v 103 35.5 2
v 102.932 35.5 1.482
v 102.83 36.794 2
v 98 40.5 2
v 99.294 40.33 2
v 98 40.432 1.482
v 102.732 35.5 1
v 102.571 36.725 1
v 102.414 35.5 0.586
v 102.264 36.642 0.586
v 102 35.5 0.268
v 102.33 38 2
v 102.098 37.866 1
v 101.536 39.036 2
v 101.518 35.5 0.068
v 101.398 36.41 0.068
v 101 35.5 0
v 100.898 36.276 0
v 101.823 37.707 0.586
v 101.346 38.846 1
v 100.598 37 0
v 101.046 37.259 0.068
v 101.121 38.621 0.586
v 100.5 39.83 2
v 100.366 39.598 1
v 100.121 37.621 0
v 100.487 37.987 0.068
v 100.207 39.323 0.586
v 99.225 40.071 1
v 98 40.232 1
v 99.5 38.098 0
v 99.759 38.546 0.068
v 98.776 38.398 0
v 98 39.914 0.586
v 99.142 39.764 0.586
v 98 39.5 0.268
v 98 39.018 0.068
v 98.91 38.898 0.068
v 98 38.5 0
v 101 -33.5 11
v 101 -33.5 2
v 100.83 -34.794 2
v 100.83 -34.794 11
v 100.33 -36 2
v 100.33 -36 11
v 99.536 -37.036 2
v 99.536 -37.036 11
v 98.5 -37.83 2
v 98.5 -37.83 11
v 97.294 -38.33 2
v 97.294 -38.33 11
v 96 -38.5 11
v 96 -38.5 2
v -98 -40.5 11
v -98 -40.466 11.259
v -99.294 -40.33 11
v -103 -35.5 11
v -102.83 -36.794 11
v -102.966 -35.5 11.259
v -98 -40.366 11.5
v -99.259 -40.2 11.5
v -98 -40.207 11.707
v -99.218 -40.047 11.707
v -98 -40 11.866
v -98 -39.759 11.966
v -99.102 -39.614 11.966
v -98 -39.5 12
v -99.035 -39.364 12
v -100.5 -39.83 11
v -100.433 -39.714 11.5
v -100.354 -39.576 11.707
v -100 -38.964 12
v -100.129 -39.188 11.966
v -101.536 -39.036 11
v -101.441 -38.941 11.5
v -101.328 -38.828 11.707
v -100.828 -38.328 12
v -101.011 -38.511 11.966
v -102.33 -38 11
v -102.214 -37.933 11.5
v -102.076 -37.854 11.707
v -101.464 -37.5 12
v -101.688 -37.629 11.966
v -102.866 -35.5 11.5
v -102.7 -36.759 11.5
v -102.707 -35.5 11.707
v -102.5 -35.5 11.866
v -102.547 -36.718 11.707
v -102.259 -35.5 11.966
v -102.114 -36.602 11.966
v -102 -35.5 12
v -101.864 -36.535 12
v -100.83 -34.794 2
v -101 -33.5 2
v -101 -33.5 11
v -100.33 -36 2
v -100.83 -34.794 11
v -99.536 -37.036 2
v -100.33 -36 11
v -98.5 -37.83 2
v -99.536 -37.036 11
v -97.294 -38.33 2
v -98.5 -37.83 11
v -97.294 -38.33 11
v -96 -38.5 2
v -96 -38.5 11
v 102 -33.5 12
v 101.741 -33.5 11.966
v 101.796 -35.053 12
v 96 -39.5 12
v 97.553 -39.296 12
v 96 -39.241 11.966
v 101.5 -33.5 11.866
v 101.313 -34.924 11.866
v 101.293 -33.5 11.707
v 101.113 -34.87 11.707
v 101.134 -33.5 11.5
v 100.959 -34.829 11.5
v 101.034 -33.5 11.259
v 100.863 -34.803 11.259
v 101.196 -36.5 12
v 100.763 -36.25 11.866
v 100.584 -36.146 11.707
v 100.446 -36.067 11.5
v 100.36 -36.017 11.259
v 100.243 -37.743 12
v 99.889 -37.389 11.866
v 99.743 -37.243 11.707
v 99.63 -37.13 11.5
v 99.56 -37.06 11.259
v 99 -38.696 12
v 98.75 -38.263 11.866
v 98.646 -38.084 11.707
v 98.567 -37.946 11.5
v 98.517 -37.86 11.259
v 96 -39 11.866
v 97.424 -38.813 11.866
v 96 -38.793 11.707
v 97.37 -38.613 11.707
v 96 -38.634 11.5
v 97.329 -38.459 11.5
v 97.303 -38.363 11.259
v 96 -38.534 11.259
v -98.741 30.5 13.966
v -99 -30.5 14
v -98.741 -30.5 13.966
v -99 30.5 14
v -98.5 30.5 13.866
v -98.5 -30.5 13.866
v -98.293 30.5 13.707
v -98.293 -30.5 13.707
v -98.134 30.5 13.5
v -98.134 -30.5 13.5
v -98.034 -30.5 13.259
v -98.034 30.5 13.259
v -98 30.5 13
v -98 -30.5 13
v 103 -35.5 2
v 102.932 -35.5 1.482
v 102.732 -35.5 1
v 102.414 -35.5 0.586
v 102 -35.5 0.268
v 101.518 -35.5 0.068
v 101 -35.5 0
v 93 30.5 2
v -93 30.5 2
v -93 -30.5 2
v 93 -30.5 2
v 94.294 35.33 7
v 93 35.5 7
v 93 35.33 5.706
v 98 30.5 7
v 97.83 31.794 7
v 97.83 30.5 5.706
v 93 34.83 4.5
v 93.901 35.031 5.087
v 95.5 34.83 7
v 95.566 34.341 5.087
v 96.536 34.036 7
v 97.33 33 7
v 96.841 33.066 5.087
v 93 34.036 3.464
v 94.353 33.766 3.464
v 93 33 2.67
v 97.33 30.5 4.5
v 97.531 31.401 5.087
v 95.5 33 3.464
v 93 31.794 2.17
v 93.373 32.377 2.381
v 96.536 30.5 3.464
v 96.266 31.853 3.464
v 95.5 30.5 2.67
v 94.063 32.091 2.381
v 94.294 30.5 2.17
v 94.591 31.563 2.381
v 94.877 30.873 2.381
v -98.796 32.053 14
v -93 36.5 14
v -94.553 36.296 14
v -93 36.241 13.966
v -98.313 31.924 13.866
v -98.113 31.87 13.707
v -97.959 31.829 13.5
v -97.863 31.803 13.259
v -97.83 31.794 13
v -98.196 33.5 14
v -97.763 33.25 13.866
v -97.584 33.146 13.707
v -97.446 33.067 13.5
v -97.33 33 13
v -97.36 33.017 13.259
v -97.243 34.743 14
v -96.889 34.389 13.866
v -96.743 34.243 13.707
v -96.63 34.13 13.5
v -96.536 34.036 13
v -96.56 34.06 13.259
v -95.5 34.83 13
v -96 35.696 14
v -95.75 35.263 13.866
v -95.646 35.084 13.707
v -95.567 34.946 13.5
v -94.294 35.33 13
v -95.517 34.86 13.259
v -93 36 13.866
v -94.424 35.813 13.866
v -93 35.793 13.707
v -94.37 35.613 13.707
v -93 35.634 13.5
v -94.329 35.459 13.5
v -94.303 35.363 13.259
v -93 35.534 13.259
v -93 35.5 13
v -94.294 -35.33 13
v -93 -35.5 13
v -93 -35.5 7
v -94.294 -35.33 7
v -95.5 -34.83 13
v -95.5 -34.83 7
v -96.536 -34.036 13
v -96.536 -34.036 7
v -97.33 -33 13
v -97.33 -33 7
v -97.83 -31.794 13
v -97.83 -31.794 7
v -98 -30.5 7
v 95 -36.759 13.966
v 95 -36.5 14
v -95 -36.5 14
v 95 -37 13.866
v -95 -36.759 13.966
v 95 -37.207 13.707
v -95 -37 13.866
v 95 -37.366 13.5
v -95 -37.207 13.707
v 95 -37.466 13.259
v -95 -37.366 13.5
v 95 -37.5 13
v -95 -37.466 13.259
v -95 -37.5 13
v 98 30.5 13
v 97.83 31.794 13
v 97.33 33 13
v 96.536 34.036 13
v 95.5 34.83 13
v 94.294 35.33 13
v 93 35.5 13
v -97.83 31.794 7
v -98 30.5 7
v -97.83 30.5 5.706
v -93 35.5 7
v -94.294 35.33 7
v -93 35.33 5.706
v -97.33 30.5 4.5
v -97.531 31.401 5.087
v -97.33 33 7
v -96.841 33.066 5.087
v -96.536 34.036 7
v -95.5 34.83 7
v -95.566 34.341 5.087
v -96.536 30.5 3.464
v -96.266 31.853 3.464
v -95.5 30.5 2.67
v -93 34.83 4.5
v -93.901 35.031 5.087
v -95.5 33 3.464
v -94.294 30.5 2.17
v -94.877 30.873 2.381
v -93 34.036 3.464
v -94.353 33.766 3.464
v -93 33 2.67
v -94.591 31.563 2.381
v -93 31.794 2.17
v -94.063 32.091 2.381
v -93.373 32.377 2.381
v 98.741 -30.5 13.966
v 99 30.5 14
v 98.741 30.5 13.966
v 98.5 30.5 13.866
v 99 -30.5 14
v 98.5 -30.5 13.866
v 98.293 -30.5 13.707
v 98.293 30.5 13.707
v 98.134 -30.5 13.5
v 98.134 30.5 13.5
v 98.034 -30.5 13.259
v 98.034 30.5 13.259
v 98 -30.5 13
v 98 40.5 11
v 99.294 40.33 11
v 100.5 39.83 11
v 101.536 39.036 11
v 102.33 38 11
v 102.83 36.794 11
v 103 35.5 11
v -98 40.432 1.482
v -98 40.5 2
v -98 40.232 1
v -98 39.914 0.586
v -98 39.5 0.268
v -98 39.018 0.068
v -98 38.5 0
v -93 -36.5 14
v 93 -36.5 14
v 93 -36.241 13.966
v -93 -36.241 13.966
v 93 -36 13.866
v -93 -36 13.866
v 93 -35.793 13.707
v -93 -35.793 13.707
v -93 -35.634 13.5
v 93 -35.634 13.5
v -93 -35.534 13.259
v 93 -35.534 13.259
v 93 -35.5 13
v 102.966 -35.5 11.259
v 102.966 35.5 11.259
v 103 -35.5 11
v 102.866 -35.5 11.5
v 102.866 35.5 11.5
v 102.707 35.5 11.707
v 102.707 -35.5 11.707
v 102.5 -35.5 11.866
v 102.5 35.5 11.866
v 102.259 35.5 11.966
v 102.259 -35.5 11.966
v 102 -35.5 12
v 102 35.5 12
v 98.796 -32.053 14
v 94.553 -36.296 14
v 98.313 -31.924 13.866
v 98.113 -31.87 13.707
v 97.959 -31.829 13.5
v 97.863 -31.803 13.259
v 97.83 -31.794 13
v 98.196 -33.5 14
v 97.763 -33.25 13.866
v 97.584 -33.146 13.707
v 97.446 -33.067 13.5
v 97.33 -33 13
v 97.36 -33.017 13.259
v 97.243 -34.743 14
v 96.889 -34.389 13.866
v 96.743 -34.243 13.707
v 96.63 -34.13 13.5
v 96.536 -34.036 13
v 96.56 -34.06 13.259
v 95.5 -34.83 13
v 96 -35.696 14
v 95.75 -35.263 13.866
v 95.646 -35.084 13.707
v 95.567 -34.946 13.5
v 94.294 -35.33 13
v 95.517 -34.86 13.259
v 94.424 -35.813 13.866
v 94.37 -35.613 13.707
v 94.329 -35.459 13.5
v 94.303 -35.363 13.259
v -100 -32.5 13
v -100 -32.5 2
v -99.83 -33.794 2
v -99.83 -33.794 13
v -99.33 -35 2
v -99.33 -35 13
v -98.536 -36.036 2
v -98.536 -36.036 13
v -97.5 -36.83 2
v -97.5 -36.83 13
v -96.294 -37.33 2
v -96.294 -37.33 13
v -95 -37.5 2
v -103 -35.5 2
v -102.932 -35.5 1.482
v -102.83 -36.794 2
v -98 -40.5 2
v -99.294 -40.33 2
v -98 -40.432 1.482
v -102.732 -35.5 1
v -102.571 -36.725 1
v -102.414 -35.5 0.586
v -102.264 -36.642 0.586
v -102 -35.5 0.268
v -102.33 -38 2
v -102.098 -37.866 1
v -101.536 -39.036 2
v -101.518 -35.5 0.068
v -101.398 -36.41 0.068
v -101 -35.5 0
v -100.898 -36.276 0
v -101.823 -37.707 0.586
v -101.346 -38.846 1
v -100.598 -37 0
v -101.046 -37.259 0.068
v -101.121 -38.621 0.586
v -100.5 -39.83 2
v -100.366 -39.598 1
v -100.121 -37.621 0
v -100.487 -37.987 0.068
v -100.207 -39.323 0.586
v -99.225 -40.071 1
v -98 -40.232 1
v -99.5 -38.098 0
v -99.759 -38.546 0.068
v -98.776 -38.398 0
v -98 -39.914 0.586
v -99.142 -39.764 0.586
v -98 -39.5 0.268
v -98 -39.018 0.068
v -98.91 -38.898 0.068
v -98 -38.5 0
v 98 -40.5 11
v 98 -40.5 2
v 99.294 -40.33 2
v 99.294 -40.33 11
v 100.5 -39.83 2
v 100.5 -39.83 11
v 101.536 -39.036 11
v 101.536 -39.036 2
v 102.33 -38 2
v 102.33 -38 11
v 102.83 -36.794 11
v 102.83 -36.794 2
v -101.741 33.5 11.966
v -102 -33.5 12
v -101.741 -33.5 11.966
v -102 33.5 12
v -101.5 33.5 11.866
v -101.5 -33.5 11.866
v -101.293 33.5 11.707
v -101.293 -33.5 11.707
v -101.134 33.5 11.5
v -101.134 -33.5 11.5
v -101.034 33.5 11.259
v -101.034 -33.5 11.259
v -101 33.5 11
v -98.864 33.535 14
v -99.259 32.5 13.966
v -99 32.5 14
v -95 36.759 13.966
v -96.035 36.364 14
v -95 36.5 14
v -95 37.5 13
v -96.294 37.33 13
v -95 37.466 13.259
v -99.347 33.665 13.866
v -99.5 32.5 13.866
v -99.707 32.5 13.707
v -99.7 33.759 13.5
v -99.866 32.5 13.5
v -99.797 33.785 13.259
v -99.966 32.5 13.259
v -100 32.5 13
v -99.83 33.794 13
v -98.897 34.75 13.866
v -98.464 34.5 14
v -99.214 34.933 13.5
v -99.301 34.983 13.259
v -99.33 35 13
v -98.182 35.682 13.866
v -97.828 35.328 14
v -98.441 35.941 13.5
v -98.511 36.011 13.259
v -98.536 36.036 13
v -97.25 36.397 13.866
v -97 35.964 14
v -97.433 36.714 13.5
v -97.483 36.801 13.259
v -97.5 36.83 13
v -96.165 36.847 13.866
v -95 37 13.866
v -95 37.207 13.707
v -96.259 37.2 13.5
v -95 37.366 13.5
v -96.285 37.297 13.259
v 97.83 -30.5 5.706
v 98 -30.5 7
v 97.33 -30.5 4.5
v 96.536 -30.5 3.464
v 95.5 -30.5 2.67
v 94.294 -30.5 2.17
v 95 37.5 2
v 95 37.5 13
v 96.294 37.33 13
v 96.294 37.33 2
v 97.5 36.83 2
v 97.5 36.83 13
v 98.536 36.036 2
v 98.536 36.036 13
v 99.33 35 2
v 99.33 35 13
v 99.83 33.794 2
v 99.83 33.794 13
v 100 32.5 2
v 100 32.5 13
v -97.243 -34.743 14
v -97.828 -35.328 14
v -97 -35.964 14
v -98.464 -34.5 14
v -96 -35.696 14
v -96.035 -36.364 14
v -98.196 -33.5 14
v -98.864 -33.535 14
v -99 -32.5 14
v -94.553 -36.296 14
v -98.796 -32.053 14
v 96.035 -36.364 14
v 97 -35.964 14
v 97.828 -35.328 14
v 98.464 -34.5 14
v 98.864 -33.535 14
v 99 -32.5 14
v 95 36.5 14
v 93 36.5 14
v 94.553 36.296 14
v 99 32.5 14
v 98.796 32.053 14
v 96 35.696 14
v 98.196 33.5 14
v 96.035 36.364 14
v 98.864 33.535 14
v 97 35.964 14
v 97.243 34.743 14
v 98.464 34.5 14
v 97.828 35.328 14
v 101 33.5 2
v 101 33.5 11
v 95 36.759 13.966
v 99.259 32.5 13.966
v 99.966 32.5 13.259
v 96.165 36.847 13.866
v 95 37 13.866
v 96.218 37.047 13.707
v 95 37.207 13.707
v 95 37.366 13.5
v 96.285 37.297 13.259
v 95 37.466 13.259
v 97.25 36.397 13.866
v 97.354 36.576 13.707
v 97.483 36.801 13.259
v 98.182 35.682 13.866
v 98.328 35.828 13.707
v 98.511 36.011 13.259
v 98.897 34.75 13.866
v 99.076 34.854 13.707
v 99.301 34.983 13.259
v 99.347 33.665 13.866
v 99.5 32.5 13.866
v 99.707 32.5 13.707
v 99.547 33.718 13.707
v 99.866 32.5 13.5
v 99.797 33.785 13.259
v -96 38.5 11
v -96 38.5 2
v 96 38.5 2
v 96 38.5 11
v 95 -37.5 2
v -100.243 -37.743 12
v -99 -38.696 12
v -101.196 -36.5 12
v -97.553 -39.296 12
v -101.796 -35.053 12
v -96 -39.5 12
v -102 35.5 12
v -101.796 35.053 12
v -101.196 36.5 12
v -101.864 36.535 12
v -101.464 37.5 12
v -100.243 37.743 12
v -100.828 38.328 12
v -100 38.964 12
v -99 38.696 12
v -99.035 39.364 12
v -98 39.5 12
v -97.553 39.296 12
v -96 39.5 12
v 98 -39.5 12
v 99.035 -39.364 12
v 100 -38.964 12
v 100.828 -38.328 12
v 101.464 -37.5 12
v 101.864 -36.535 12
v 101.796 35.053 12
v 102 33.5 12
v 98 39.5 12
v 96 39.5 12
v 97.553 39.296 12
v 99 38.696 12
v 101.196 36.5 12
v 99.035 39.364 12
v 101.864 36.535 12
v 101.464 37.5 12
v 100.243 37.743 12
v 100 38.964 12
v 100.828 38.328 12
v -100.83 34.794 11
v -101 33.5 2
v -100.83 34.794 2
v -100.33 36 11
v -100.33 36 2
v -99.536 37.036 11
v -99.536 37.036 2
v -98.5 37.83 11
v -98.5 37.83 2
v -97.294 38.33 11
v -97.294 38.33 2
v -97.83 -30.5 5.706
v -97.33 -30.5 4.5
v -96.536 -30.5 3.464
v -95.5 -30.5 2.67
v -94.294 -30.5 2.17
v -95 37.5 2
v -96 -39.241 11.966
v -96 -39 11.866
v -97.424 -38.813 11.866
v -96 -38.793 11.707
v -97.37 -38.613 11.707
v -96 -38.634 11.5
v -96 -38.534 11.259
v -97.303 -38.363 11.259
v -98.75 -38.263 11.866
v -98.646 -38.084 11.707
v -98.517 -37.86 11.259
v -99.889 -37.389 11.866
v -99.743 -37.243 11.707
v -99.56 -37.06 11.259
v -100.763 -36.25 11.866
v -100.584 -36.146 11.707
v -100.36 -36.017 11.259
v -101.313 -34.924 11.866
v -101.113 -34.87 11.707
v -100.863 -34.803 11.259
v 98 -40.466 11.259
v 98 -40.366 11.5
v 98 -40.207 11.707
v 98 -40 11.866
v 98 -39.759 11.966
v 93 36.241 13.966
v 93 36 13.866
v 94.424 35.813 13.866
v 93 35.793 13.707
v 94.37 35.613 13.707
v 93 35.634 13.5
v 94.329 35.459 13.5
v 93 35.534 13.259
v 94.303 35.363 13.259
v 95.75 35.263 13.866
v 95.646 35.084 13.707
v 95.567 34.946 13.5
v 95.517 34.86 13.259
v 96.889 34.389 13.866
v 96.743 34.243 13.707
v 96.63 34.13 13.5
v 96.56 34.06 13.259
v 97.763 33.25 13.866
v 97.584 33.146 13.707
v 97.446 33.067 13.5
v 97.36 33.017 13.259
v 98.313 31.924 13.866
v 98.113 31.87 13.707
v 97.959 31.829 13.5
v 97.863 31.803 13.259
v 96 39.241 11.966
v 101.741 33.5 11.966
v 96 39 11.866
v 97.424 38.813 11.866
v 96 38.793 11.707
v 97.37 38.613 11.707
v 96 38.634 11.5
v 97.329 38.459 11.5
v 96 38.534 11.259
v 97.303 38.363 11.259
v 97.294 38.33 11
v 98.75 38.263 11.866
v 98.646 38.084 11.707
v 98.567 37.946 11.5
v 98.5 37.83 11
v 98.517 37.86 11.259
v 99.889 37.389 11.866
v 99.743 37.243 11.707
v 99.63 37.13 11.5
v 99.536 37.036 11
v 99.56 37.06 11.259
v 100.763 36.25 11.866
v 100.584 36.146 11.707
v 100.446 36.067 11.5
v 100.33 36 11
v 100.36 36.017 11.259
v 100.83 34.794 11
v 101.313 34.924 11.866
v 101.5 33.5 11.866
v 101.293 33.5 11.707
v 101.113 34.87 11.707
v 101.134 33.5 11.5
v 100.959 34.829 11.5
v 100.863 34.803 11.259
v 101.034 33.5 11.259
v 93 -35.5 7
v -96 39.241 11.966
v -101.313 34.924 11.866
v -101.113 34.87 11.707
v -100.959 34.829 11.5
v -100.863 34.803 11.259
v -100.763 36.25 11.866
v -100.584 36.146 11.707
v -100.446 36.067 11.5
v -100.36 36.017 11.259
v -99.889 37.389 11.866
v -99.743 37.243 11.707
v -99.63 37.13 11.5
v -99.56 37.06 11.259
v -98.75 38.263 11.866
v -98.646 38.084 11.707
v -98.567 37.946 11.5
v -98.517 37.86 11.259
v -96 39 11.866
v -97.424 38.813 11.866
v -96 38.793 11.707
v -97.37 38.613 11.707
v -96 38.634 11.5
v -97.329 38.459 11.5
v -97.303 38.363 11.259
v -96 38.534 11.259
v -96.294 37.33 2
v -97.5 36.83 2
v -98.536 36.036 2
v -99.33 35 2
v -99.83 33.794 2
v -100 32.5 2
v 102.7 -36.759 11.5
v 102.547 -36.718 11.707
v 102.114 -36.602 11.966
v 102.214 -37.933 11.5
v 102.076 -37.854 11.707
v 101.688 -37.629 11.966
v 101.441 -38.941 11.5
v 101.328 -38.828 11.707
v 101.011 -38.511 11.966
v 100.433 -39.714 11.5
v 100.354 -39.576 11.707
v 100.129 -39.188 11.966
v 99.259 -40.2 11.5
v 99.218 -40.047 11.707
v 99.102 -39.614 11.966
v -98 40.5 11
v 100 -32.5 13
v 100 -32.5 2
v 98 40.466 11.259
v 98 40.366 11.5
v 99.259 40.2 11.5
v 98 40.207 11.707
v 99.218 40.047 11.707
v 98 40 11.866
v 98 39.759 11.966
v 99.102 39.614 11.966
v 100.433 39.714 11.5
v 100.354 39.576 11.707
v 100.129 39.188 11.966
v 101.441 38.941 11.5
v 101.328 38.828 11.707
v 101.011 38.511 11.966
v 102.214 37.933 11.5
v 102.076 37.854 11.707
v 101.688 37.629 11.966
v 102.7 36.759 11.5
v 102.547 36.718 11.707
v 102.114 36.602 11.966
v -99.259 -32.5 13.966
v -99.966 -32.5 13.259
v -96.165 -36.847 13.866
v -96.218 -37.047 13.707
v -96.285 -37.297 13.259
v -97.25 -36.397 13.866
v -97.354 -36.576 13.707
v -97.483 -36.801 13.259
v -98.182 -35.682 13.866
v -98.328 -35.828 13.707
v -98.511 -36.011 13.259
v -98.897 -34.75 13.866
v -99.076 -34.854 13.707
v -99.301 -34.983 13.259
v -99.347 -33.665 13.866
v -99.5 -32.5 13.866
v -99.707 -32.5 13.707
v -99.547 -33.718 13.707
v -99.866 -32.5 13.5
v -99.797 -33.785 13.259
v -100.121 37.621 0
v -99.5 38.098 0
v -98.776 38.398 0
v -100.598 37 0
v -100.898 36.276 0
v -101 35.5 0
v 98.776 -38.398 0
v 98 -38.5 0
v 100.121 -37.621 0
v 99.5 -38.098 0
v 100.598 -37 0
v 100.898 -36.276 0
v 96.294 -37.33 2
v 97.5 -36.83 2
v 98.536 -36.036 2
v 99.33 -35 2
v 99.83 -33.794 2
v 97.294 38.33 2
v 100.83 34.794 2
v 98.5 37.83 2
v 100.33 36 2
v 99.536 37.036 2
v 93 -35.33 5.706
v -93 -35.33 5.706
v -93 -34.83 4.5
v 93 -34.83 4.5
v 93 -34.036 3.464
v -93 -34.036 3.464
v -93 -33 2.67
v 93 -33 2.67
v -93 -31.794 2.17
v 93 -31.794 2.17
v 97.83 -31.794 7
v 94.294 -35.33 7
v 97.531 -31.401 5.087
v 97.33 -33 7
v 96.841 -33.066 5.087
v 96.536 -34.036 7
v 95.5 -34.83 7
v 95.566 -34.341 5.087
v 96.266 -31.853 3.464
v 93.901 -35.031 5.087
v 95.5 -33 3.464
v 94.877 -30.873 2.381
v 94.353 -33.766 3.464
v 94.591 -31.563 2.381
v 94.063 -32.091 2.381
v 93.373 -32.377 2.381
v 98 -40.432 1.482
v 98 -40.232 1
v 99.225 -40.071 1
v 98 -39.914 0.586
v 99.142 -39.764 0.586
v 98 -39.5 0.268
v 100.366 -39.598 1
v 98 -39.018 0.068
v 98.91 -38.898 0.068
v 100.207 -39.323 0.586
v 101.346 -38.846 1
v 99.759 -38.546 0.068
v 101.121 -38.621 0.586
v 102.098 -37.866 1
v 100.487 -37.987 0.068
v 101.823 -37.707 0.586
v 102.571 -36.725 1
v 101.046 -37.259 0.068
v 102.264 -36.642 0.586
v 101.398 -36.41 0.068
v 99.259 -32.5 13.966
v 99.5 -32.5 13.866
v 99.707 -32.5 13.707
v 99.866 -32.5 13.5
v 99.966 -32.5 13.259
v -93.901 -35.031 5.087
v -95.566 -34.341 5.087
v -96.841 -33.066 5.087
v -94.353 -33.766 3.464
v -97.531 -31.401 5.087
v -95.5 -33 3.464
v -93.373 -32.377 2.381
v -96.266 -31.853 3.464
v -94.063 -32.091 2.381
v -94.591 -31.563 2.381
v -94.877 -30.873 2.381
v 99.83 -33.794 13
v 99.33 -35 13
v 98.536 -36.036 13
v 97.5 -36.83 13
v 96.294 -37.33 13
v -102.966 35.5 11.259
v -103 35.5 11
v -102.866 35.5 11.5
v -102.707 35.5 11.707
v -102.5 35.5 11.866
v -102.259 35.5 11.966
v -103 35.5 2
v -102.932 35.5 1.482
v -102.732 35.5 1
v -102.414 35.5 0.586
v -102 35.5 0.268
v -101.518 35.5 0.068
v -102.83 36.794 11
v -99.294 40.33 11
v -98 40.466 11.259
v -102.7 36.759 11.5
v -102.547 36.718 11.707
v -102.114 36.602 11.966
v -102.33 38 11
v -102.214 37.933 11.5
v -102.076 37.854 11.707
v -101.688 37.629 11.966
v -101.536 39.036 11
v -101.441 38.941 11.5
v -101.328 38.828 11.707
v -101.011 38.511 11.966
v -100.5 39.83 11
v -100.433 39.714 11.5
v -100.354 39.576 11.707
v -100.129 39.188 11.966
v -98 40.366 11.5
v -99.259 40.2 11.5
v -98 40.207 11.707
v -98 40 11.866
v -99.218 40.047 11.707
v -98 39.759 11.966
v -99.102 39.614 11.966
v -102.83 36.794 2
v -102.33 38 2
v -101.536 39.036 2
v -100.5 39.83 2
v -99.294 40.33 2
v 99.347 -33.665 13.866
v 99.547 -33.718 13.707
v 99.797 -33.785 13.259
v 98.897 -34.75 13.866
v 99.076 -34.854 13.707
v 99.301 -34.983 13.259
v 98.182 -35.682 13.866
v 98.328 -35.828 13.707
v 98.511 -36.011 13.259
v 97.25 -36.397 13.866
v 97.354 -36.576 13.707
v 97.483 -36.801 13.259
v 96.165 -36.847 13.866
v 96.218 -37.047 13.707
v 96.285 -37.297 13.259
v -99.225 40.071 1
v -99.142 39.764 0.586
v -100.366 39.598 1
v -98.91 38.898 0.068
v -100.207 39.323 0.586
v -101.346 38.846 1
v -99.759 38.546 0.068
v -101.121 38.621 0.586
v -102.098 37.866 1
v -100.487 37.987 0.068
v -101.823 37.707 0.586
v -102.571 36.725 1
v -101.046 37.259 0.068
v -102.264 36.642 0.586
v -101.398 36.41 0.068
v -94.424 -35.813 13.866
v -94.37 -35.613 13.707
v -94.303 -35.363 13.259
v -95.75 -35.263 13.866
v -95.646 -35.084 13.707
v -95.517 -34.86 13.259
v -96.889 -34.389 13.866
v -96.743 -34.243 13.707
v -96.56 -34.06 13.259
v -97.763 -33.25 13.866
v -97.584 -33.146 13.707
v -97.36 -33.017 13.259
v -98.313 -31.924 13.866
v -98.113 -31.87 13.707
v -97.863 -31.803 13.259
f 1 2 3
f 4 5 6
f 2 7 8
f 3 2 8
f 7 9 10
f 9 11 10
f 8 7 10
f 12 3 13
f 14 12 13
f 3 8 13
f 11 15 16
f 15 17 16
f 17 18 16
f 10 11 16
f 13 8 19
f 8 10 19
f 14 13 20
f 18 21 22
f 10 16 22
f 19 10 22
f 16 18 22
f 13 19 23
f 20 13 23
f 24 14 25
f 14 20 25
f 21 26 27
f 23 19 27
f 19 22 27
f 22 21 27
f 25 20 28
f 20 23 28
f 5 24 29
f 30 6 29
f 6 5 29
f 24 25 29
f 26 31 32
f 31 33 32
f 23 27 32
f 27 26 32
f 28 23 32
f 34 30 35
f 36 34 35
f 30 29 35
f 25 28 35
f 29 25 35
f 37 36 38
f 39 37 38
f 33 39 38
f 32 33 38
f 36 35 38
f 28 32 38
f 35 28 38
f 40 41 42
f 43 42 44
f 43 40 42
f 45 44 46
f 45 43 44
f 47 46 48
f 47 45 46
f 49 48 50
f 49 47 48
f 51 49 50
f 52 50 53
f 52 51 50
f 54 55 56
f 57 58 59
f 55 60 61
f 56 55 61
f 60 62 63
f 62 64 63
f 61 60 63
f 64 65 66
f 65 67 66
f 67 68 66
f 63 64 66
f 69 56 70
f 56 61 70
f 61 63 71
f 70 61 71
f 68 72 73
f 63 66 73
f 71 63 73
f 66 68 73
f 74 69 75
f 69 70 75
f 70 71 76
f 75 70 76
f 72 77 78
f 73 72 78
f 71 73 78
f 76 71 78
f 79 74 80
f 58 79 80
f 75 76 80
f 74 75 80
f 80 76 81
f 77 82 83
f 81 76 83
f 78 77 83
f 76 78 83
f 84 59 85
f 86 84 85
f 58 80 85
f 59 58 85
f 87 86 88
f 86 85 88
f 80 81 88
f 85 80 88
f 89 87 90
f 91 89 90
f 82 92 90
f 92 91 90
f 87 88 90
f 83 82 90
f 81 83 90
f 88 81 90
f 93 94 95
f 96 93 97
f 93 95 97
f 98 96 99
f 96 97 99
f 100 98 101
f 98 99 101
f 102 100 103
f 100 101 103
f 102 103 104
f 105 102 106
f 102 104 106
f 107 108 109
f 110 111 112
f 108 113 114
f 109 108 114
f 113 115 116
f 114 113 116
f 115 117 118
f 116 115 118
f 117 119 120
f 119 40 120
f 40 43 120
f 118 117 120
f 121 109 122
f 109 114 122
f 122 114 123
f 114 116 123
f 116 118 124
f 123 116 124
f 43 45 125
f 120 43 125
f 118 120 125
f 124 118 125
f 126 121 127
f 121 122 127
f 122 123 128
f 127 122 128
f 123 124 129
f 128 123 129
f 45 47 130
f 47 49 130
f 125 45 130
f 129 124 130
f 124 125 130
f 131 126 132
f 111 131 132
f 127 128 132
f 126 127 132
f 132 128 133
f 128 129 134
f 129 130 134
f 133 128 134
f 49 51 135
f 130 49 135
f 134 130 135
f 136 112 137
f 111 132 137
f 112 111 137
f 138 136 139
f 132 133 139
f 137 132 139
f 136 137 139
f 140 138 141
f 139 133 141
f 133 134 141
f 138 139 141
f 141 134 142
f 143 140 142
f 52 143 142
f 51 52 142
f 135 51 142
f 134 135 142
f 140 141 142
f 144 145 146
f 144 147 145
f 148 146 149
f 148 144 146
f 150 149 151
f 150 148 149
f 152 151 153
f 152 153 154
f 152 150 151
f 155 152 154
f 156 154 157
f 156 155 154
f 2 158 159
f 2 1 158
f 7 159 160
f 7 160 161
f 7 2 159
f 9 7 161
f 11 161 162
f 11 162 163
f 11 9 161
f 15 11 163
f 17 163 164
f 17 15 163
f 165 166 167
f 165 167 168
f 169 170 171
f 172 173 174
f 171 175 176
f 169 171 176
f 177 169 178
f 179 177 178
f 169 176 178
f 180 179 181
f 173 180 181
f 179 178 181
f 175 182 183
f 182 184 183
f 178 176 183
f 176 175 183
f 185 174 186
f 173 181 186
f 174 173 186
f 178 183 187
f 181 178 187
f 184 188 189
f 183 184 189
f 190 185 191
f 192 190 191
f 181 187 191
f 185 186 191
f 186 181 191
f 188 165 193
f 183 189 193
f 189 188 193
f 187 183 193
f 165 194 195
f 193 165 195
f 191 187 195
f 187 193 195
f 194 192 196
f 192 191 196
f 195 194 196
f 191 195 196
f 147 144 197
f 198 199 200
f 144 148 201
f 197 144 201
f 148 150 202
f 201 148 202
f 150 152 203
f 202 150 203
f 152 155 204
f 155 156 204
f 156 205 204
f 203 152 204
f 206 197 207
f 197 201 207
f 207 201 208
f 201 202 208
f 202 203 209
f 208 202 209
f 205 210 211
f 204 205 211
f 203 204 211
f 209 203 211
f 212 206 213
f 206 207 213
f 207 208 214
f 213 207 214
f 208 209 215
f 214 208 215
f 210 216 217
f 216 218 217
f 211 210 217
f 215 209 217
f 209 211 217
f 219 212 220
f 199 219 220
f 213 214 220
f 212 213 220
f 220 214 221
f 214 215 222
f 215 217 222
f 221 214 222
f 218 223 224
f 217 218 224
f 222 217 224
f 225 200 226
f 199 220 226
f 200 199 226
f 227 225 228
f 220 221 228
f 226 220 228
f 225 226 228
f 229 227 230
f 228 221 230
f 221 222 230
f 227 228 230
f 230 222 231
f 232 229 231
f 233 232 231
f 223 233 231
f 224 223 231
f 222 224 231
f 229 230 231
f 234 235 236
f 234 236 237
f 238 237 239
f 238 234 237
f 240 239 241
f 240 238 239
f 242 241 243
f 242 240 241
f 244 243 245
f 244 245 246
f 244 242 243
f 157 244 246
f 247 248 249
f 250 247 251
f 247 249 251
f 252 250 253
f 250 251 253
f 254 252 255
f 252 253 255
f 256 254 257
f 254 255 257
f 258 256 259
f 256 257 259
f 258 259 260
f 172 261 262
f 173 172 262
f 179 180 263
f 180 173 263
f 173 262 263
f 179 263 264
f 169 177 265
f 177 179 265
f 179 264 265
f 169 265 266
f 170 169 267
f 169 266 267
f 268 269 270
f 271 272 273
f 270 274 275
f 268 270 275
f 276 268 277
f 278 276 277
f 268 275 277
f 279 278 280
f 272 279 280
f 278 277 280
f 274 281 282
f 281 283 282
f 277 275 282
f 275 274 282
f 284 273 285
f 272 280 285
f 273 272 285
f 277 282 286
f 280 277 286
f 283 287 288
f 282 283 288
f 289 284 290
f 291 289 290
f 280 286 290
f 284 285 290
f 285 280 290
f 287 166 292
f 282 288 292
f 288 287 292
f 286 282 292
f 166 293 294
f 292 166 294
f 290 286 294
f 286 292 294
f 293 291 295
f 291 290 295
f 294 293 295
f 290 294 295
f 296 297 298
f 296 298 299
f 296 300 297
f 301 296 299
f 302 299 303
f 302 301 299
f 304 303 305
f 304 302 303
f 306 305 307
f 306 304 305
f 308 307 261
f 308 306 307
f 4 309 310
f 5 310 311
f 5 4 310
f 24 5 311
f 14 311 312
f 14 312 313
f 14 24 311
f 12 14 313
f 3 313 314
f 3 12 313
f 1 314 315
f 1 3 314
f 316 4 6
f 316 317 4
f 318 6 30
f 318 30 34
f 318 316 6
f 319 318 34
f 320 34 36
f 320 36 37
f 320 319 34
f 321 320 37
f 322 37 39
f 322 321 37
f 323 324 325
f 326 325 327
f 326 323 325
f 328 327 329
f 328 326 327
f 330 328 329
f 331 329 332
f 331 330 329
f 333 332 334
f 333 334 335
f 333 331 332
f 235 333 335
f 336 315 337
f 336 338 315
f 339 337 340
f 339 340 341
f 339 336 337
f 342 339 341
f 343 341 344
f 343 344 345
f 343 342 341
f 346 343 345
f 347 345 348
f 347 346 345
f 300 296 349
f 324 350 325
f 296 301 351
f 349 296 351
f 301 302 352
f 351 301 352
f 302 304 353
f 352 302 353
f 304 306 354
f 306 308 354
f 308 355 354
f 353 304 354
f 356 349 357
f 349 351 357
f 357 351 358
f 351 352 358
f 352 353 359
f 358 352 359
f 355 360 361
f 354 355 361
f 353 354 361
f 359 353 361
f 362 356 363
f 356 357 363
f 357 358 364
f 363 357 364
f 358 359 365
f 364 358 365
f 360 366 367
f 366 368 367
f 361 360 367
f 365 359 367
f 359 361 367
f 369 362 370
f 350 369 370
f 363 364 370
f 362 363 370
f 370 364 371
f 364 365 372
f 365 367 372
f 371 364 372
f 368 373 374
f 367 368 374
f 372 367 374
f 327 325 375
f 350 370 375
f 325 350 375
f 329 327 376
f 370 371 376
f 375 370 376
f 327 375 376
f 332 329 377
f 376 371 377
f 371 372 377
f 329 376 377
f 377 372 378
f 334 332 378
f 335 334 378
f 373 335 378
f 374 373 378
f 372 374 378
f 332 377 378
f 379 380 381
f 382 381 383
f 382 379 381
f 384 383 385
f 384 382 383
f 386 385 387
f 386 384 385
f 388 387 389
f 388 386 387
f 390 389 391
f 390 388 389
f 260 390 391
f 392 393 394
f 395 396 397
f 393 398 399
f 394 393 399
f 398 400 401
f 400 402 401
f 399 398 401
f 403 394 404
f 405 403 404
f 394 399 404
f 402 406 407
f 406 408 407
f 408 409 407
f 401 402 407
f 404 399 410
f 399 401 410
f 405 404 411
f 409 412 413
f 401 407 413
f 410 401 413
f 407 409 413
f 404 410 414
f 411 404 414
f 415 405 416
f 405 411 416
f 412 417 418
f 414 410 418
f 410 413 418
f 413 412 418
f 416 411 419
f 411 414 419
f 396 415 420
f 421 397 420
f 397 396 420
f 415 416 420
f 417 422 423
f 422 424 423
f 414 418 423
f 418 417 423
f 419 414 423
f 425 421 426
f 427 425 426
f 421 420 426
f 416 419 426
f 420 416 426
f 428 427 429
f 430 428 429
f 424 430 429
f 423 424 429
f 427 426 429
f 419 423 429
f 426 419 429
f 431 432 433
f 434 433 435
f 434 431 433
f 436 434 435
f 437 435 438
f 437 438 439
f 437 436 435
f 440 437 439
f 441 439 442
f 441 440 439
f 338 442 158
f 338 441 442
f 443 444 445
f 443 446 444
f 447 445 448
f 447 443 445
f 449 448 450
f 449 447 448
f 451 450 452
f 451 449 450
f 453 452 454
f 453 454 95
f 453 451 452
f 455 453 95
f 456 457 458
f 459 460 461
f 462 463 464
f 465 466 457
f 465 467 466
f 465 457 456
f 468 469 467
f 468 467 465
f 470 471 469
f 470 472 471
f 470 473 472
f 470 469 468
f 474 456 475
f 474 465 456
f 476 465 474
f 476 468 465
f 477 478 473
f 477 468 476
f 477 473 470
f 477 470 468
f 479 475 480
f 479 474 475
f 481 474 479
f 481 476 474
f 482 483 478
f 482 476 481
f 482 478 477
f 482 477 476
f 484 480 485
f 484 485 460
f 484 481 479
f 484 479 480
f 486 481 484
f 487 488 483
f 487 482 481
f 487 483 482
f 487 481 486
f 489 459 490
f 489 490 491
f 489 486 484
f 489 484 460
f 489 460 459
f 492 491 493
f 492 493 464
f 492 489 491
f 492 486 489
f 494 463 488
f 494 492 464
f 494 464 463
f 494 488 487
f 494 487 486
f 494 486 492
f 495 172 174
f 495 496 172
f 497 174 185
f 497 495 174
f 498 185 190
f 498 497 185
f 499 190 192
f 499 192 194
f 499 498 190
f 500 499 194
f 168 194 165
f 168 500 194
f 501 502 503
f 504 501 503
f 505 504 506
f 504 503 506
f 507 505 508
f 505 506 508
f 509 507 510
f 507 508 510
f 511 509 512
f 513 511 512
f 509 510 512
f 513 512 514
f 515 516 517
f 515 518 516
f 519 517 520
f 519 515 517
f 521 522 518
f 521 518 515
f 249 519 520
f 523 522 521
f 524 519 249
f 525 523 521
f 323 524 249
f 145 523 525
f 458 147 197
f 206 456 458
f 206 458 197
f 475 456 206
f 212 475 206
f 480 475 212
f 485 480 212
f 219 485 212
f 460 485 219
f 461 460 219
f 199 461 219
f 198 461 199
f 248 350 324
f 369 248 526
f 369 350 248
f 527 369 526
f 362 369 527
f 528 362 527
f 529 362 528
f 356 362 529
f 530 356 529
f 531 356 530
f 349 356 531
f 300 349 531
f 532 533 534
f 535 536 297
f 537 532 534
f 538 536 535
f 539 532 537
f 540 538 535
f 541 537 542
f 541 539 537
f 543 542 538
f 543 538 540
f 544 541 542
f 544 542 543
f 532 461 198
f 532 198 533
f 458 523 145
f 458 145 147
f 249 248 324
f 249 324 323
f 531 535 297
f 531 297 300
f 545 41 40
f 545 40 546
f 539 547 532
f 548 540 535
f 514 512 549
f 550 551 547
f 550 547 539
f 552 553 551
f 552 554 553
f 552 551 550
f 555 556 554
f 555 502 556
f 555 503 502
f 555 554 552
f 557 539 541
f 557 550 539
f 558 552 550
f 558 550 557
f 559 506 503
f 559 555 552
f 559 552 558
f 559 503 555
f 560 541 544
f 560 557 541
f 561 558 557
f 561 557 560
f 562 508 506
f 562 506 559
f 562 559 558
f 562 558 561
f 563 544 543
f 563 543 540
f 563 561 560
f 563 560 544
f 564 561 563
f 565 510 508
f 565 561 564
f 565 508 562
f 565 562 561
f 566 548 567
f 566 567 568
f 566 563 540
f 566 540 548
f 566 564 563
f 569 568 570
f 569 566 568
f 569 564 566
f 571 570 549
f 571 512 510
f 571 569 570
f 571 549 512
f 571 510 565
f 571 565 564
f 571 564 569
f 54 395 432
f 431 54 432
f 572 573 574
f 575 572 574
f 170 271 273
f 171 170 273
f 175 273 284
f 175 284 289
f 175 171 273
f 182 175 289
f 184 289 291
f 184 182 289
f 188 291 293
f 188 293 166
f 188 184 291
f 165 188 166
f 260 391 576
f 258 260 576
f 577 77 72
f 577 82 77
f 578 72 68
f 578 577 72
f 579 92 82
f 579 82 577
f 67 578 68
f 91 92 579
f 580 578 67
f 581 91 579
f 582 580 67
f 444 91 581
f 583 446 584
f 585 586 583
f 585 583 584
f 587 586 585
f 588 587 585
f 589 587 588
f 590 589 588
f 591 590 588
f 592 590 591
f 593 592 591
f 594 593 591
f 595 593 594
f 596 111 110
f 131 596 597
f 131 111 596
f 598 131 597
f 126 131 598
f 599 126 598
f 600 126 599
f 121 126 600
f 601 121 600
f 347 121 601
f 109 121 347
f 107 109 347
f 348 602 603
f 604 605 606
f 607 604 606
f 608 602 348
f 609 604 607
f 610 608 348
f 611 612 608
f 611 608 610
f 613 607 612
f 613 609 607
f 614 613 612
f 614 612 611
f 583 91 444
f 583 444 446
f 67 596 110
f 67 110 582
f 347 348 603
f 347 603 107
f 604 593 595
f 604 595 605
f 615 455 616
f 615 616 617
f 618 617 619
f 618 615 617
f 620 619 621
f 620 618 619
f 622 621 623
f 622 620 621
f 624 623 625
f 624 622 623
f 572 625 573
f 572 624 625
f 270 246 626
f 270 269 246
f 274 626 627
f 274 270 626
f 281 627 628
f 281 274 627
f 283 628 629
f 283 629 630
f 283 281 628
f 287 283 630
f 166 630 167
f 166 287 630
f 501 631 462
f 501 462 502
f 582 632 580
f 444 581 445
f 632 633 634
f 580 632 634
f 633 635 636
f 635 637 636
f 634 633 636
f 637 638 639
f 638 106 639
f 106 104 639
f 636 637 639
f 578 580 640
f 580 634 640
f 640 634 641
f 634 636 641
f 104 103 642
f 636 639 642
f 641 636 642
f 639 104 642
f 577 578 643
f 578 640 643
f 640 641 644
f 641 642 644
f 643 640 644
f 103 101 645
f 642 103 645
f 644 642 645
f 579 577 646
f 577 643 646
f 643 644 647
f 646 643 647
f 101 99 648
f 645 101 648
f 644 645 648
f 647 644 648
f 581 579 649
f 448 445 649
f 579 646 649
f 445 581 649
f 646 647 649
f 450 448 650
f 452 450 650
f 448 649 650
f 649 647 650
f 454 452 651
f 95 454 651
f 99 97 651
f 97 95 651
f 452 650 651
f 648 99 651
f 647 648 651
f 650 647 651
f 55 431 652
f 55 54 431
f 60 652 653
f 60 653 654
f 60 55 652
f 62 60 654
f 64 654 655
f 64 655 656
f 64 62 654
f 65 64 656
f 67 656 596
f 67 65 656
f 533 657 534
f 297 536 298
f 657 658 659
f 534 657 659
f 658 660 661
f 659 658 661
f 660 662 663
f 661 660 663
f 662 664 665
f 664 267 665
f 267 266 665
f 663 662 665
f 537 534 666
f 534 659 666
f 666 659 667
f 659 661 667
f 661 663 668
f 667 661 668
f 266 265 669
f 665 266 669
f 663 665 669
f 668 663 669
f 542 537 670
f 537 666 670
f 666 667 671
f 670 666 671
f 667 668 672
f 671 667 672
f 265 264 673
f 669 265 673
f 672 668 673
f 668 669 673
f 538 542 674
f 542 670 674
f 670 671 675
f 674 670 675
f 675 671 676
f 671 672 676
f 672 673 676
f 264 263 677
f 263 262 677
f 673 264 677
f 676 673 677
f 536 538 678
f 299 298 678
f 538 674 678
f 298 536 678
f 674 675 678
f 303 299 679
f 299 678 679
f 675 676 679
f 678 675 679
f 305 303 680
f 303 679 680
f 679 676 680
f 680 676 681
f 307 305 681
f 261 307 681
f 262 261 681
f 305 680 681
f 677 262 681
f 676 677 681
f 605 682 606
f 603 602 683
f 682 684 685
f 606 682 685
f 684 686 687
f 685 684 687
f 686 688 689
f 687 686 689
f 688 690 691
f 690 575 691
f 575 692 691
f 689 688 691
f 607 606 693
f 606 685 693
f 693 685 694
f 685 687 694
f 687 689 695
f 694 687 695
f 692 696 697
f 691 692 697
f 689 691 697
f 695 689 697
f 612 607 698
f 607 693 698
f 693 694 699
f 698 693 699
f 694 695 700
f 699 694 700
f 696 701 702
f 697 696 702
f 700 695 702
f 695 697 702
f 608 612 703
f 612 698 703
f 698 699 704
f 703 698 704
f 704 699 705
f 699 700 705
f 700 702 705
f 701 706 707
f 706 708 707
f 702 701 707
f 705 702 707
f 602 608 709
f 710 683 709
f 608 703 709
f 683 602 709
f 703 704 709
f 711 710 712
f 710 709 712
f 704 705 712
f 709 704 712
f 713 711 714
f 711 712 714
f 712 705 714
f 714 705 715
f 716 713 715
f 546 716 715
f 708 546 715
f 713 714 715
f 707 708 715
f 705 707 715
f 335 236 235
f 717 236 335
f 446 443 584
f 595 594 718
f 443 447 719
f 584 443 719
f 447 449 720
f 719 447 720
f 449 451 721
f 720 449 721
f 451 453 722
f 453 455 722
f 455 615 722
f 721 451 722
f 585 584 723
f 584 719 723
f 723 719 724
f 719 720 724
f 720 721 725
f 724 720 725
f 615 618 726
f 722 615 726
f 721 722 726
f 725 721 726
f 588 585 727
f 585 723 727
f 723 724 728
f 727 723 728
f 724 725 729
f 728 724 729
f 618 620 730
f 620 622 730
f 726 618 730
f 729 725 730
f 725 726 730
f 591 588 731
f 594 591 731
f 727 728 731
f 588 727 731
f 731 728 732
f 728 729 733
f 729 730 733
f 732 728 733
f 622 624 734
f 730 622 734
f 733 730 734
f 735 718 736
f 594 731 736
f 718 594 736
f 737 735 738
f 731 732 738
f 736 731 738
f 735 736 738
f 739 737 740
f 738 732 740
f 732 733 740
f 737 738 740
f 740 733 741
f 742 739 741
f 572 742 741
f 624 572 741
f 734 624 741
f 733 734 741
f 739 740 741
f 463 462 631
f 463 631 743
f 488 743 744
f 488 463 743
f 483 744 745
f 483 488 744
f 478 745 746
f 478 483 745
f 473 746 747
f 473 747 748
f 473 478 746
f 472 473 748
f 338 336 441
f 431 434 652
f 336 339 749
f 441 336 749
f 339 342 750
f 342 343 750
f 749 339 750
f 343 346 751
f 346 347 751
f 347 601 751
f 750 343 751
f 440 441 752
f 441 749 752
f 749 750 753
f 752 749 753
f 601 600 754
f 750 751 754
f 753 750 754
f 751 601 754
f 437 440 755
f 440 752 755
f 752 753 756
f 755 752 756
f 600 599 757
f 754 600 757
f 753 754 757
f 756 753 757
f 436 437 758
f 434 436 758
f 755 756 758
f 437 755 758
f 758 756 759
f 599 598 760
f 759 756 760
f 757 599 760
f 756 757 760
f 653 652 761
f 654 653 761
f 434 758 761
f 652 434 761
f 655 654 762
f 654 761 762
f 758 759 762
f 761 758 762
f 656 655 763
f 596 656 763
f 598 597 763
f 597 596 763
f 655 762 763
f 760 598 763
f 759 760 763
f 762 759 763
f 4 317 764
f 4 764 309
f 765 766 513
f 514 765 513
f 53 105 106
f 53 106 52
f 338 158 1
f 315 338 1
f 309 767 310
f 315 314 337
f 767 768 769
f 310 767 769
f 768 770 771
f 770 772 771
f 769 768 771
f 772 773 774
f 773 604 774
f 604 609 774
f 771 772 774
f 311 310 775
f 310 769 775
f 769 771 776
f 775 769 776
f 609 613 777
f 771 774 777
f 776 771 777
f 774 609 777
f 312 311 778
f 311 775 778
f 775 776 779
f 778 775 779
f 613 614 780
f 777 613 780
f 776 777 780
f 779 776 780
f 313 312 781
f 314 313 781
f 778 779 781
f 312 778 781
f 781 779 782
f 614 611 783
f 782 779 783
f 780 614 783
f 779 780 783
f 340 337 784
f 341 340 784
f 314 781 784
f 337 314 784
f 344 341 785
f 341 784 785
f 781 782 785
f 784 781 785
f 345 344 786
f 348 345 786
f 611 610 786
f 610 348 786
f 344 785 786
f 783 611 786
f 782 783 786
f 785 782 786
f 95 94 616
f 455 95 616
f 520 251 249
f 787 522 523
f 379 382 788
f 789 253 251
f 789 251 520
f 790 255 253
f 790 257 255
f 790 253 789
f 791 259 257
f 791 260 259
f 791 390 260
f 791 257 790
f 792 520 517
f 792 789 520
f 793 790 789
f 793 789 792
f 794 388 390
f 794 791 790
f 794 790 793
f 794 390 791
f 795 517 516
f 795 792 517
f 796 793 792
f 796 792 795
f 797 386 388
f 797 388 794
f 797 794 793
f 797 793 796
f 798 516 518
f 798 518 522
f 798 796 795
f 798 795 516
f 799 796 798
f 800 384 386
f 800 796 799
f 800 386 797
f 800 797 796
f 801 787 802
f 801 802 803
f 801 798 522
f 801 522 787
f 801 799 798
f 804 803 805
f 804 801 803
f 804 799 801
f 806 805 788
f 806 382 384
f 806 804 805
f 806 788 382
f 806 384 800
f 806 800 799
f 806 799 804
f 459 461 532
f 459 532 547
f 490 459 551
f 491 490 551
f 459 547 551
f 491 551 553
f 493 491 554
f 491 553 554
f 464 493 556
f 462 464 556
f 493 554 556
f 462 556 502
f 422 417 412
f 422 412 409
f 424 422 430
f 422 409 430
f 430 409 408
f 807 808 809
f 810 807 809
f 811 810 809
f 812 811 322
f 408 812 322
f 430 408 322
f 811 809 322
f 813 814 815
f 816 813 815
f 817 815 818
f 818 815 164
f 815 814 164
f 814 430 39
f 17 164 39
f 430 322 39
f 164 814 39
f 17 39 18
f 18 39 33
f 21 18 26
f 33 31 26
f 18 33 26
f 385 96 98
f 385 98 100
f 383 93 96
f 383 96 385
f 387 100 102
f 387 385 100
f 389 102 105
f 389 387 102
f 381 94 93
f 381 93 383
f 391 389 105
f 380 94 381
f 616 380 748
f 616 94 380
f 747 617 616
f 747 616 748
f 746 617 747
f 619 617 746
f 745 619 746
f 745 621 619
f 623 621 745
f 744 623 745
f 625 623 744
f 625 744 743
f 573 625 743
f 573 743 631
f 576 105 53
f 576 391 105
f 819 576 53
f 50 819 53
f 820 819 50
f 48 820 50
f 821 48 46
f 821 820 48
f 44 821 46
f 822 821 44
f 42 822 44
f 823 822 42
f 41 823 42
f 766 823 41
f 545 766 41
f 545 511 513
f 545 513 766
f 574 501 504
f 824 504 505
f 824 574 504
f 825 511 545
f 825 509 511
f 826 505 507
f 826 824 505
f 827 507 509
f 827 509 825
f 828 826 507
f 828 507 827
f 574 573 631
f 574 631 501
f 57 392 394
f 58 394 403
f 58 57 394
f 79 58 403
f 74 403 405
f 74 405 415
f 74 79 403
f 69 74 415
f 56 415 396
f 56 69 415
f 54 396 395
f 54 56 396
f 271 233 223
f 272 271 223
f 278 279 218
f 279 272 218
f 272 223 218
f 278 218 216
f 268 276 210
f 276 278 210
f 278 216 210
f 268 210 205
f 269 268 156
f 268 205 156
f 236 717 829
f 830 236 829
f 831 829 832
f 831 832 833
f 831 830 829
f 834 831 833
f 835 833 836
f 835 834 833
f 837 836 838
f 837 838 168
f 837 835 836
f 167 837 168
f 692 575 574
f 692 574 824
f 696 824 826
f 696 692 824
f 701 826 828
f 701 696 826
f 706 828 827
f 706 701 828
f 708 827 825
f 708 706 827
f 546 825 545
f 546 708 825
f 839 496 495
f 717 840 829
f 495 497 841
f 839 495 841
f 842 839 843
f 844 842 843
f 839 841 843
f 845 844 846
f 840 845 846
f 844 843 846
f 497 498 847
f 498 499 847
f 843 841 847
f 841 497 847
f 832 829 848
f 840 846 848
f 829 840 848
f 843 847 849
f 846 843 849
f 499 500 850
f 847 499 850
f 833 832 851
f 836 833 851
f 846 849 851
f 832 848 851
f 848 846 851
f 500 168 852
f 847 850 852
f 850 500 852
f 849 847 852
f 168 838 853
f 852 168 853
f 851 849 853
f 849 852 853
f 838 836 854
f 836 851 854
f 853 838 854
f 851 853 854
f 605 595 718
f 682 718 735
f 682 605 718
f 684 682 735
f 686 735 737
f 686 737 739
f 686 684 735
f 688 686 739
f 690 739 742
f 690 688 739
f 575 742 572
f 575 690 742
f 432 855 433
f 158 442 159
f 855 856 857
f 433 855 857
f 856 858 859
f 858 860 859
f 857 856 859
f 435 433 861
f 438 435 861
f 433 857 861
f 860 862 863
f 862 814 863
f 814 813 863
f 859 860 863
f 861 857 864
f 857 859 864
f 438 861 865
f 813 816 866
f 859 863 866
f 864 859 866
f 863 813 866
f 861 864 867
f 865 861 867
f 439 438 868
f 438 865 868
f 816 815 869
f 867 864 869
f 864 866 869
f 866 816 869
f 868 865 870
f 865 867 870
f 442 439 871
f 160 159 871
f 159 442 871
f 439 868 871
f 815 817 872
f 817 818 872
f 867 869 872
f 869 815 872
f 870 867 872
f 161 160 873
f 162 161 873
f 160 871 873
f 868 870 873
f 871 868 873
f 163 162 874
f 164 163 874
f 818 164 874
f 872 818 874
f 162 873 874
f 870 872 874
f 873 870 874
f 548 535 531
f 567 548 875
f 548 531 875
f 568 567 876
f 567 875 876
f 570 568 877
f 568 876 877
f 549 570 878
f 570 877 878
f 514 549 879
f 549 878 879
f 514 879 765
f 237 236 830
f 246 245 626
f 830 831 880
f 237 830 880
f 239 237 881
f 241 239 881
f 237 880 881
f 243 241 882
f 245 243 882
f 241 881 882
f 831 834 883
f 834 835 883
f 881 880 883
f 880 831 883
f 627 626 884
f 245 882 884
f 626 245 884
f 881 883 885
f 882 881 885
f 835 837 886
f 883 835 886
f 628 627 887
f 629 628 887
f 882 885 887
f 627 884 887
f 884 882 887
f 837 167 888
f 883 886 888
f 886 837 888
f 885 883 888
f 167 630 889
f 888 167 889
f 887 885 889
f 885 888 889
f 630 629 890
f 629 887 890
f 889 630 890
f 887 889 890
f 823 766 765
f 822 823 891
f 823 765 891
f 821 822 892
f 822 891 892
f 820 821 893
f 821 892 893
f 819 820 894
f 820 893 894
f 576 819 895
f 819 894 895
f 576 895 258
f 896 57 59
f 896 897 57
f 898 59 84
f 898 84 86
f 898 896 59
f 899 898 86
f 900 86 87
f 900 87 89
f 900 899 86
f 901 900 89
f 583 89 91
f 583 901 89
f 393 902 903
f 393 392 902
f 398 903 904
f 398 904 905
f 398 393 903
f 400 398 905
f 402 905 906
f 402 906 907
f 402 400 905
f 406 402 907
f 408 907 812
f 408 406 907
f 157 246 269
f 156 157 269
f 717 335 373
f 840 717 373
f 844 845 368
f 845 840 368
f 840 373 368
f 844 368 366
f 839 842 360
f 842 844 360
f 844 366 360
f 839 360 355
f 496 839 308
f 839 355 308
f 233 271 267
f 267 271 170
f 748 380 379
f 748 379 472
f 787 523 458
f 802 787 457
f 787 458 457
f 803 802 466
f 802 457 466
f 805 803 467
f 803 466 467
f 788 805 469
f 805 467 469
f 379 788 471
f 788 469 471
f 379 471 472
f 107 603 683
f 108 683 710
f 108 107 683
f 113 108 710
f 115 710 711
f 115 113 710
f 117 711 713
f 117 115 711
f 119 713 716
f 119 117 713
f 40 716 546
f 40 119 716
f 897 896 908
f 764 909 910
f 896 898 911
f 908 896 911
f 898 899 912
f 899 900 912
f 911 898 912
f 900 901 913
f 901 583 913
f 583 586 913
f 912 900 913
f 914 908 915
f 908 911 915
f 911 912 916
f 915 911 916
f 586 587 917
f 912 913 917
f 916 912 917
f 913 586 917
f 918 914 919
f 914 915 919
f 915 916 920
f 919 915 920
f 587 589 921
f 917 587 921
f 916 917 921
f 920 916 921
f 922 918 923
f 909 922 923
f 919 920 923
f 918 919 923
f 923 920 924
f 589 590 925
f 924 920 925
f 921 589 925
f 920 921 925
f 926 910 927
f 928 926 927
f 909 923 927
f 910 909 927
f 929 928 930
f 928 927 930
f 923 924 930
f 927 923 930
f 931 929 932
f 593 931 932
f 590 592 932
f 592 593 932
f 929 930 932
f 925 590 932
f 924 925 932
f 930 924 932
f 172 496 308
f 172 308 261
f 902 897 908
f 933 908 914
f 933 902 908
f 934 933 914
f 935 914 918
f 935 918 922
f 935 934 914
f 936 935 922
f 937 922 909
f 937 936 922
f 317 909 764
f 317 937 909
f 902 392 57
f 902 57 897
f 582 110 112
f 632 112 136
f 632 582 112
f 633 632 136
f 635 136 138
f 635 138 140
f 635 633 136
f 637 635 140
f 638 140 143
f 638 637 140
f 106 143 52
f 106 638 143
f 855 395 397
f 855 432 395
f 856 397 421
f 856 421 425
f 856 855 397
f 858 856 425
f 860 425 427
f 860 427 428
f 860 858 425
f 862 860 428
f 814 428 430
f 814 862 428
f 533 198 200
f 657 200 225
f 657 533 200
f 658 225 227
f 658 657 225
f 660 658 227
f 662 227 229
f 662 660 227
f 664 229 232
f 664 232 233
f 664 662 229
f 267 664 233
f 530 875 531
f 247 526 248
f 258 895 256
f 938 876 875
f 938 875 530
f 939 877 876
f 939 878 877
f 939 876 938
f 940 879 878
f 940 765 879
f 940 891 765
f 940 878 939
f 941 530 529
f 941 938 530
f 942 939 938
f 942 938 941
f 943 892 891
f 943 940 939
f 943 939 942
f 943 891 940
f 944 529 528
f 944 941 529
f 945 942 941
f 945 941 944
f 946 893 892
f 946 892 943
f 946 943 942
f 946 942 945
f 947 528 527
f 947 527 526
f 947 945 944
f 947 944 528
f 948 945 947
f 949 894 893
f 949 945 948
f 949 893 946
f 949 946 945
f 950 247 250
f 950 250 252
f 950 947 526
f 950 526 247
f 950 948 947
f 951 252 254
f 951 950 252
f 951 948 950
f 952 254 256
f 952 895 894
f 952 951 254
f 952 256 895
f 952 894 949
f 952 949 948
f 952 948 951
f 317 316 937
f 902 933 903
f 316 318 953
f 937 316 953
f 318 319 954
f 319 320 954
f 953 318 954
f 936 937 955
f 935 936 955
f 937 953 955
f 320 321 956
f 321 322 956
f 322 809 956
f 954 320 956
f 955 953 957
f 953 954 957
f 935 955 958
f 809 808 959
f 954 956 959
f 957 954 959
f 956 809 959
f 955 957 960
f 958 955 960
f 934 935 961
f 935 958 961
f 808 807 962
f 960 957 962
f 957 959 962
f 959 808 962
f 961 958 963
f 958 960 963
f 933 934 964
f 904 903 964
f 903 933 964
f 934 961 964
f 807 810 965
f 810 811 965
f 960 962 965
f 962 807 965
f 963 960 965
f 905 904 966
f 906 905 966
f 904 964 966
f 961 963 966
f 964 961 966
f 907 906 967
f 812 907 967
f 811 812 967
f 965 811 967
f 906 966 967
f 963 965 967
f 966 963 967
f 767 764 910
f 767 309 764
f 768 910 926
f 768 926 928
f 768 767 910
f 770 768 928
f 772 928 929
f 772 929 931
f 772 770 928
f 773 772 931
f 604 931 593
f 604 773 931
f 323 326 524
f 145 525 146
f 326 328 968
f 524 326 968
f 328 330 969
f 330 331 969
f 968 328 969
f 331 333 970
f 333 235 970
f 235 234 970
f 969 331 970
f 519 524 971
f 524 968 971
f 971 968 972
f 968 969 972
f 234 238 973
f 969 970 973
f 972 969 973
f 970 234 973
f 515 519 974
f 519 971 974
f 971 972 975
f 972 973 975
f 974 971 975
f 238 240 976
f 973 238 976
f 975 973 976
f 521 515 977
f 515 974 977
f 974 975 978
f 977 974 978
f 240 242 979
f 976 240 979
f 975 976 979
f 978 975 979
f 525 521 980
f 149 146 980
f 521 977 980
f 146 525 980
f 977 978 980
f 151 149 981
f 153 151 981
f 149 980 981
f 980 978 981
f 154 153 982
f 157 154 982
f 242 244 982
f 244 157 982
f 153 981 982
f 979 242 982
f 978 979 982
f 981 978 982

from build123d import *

# Parameters (mm, degrees)
F0_W     = 206
F0_H     = 81
F1_DEPTH = 2
F2_W     = 200
F2_H     = 75
F2_W_2   = 196
F2_H_2   = 71
F3_DEPTH = 12
F2_W_3   = 206
F2_H_3   = 81
F2_W_4   = 202
F2_H_4   = 77
F4_DEPTH = 10
F5_R     = 5
F6_R     = 5
F7_R     = 0.99999
F8_R     = 5
F9_R     = 5
F10_R    = 2
F11_R    = 0.99999
F12_R    = 5


# Not quite as in the source:
# - a fillet or chamfer is up to 0.001 mm smaller than in the source, because OpenCascade refuses the exact size


with BuildPart() as f1:
    # F0 (on Top) → F1 (new body)
    with BuildSketch(Plane.XY):
        Rectangle(F0_W, F0_H)
    extrude(amount=F1_DEPTH)

    # F2 (on face) → F3 (join)
    with BuildSketch(Plane.XY.offset(2)):
        Rectangle(F2_W, F2_H)
        Rectangle(F2_W_2, F2_H_2, mode=Mode.SUBTRACT)
    extrude(amount=F3_DEPTH)

    # F2 (on face) → F4 (join)
    with BuildSketch(Plane.XY.offset(2)):
        Rectangle(F2_W_3, F2_H_3)
        Rectangle(F2_W_4, F2_H_4, mode=Mode.SUBTRACT)
    extrude(amount=F4_DEPTH)

    # F5
    f5_edges = [f1.edges().sort_by_distance(p)[0] for p in [
        (-100, -37.5, 8),
        (-100, 37.5, 8),
        (100, 37.5, 8),
        (100, -37.5, 8),
    ]]
    fillet(f5_edges, radius=F5_R)

    # F6
    f6_edges = [f1.edges().sort_by_distance(p)[0] for p in [
        (-98, -35.5, 8),
        (-98, 35.5, 8),
        (98, 35.5, 8),
        (98, -35.5, 8),
    ]]
    fillet(f6_edges, radius=F6_R)

    # F7 (radius 1 in the source; OpenCascade refuses exactly that, so slightly less here)
    f7_edges = [f1.edges().sort_by_distance(p)[0] for p in [
        (-98, 0, 14),
        (-96.535534, -34.035534, 14),
        (-96.535534, 34.035534, 14),
        (0, -35.5, 14),
        (0, 35.5, 14),
        (96.535534, -34.035534, 14),
        (96.535534, 34.035534, 14),
        (98, 0, 14),
        (0, 37.5, 14),
        (98.535534, 36.035534, 14),
        (-98.535534, 36.035534, 14),
        (100, 0, 14),
        (-100, 0, 14),
        (98.535534, -36.035534, 14),
        (-98.535534, -36.035534, 14),
        (0, -37.5, 14),
    ]]
    fillet(f7_edges, radius=F7_R)

    # F8
    f8_edges = [f1.edges().sort_by_distance(p)[0] for p in [
        (-101, 38.5, 7),
        (-101, -38.5, 7),
        (101, -38.5, 7),
        (101, 38.5, 7),
    ]]
    fillet(f8_edges, radius=F8_R)

    # F9
    f9_edges = [f1.edges().sort_by_distance(p)[0] for p in [
        (-103, -40.5, 6),
        (103, -40.5, 6),
        (103, 40.5, 6),
        (-103, 40.5, 6),
    ]]
    fillet(f9_edges, radius=F9_R)

    # F10
    f10_edges = [f1.edges().sort_by_distance(p)[0] for p in [
        (0, -40.5, 0),
        (-101.535534, -39.035534, 0),
        (101.535534, -39.035534, 0),
        (-103, 0, 0),
        (103, 0, 0),
        (-101.535534, 39.035534, 0),
        (101.535534, 39.035534, 0),
        (0, 40.5, 0),
    ]]
    fillet(f10_edges, radius=F10_R)

    # F11 (radius 1 in the source; OpenCascade refuses exactly that, so slightly less here)
    f11_edges = [f1.edges().sort_by_distance(p)[0] for p in [
        (-103, 0, 12),
        (-101.535534, 39.035534, 12),
        (-101.535534, -39.035534, 12),
        (0, 40.5, 12),
        (0, -40.5, 12),
        (101.535534, 39.035534, 12),
        (101.535534, -39.035534, 12),
        (103, 0, 12),
        (-101, 0, 12),
        (-99.535534, -37.035534, 12),
        (-99.535534, 37.035534, 12),
        (0, -38.5, 12),
        (0, 38.5, 12),
        (99.535534, -37.035534, 12),
        (99.535534, 37.035534, 12),
        (101, 0, 12),
    ]]
    fillet(f11_edges, radius=F11_R)

    # F12
    f12_edges = [f1.edges().sort_by_distance(p)[0] for p in [
        (-98, 0, 2),
        (-96.535534, -34.035534, 2),
        (-96.535534, 34.035534, 2),
        (0, -35.5, 2),
        (0, 35.5, 2),
        (96.535534, -34.035534, 2),
        (96.535534, 34.035534, 2),
        (98, 0, 2),
    ]]
    fillet(f12_edges, radius=F12_R)


solid = f1.part
